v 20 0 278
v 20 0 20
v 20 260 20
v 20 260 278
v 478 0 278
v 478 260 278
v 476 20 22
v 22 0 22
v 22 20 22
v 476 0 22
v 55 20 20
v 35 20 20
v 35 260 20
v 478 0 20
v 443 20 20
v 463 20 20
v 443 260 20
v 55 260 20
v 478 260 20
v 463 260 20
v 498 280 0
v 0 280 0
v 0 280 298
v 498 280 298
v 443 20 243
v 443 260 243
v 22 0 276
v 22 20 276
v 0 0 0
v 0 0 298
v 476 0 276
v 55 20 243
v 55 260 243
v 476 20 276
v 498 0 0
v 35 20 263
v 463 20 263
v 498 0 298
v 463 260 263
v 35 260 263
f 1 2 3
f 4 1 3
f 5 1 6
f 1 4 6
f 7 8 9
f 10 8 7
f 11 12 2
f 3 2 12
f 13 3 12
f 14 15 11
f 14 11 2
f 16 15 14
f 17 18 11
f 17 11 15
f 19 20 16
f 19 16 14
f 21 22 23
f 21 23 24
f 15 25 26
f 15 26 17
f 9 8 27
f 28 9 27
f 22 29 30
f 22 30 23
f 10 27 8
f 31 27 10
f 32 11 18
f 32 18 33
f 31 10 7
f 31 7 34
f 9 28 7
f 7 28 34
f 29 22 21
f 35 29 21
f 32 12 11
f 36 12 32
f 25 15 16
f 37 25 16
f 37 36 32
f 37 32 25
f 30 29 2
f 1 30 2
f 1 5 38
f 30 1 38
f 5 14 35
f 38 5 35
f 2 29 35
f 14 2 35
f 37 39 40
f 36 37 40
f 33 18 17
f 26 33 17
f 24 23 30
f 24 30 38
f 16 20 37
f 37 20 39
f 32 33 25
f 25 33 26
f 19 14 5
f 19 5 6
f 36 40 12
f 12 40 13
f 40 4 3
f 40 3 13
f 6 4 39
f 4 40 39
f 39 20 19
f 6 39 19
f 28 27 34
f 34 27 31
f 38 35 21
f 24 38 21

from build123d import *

# Parameters (mm, degrees)
F0_W     = 498
F0_H     = 280
F1_DEPTH = 298
F2_T     = -20
F4_DEPTH = 240
F5_W     = 453.9999861717
F5_H     = 253.9999861717
F6_DEPTH = 20


with BuildPart() as f1:
    # F0 (on Top) → F1 (new body)
    with BuildSketch(Plane.XY):
        with Locations((249, 140)):
            Rectangle(F0_W, F0_H)
    extrude(amount=F1_DEPTH)

    # F2
    f2_openings = [f1.faces().sort_by_distance(p)[0] for p in [
        (249, 0, 149),
    ]]
    offset(amount=F2_T, openings=f2_openings)

    # F3 (on face) → F4 (join, through all)
    with BuildSketch(Plane.XZ.offset(-260)):
        Polygon((463, 263), (35, 263), (35, 20), (55, 20), (55, 243), (443, 243), (443, 20), (463, 20), align=None)
    extrude(amount=F4_DEPTH)


with BuildPart() as f6:
    # F5 (on face) → F6 (new body)
    with BuildSketch(Plane.XZ):
        with Locations((249, 149)):
            Rectangle(F5_W, F5_H)
    extrude(amount=-F6_DEPTH)


solid = Compound([f1.part, f6.part])
